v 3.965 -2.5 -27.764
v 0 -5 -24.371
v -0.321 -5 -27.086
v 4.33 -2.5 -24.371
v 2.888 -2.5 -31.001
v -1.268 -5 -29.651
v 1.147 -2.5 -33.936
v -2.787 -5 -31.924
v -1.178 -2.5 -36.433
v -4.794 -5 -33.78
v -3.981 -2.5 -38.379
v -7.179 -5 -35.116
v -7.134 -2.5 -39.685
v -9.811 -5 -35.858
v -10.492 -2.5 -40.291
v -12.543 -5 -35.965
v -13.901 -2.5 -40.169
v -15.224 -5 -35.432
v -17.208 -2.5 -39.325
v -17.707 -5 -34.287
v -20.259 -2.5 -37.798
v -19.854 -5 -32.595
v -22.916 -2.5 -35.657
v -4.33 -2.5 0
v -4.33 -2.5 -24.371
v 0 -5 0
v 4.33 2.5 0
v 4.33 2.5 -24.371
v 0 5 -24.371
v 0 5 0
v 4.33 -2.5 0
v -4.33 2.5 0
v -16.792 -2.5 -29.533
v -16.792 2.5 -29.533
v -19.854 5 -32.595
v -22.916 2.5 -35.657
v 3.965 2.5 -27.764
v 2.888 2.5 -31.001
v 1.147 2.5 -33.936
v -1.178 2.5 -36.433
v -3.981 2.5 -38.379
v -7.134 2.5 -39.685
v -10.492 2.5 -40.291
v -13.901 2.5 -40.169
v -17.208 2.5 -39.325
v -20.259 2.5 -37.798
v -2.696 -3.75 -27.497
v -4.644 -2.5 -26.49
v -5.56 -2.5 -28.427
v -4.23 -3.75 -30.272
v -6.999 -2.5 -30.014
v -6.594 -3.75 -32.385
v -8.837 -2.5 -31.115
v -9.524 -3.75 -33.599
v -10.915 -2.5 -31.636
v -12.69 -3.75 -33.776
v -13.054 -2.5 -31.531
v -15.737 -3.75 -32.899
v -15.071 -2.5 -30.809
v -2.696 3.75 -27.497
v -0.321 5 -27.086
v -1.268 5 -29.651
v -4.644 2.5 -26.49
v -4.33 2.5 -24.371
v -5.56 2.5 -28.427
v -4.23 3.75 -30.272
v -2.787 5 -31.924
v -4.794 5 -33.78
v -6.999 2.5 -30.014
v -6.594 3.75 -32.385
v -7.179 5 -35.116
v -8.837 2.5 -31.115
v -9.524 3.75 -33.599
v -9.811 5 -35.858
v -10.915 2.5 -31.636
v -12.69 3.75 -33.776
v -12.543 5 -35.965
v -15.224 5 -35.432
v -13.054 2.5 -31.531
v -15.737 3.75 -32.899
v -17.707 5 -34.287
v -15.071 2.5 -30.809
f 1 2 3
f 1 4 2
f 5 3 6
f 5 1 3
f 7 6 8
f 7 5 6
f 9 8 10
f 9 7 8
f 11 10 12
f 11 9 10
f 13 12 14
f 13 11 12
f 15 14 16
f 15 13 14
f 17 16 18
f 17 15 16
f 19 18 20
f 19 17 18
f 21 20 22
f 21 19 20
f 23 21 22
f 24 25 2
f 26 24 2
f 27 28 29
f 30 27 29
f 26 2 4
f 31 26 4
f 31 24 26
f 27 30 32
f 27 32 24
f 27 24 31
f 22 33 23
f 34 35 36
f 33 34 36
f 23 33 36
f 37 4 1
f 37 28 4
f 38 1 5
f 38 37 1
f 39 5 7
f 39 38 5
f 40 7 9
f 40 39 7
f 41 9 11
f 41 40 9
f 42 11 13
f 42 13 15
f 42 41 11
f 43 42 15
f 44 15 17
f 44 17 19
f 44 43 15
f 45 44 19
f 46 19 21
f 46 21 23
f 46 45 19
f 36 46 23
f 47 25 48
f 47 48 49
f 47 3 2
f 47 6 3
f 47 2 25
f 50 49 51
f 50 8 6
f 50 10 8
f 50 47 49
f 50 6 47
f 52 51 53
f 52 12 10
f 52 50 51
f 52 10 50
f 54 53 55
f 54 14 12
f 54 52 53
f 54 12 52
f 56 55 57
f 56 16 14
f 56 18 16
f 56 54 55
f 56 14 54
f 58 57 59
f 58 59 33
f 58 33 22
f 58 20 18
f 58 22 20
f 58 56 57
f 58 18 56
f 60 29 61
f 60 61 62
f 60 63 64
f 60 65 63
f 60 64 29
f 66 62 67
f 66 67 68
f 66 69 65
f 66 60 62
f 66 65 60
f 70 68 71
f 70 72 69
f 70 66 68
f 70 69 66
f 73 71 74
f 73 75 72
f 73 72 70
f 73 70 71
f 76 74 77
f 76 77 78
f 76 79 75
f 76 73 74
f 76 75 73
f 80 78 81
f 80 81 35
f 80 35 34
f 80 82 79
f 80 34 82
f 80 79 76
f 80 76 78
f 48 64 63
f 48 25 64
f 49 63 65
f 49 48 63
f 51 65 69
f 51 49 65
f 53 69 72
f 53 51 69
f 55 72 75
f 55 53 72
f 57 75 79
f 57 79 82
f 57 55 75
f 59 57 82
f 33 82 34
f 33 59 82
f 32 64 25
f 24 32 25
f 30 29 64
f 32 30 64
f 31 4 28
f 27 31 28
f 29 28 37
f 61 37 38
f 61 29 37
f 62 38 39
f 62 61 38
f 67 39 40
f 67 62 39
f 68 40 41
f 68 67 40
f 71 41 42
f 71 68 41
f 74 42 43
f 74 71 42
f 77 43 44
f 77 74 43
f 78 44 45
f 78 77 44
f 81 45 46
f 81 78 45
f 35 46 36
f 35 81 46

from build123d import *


with BuildPart() as f2:
    # F2: sweep along a path in F0
    with BuildLine(Plane.XZ) as f2_path:
        Line((0, 0), (0, -24.370959))
        ThreePointArc((0, -24.370959), (-7.179451, -35.115767), (-19.853817, -32.594679))
    # F1 (on Top) → F2 (sweep)
    with BuildSketch(Plane.XY):
        Polygon((-4.330127, -2.5), (0, -5), (4.330127, -2.5), (4.330127, 2.5), (0, 5), (-4.330127, 2.5), align=None)
    sweep(path=f2_path.line)


solid = f2.part
